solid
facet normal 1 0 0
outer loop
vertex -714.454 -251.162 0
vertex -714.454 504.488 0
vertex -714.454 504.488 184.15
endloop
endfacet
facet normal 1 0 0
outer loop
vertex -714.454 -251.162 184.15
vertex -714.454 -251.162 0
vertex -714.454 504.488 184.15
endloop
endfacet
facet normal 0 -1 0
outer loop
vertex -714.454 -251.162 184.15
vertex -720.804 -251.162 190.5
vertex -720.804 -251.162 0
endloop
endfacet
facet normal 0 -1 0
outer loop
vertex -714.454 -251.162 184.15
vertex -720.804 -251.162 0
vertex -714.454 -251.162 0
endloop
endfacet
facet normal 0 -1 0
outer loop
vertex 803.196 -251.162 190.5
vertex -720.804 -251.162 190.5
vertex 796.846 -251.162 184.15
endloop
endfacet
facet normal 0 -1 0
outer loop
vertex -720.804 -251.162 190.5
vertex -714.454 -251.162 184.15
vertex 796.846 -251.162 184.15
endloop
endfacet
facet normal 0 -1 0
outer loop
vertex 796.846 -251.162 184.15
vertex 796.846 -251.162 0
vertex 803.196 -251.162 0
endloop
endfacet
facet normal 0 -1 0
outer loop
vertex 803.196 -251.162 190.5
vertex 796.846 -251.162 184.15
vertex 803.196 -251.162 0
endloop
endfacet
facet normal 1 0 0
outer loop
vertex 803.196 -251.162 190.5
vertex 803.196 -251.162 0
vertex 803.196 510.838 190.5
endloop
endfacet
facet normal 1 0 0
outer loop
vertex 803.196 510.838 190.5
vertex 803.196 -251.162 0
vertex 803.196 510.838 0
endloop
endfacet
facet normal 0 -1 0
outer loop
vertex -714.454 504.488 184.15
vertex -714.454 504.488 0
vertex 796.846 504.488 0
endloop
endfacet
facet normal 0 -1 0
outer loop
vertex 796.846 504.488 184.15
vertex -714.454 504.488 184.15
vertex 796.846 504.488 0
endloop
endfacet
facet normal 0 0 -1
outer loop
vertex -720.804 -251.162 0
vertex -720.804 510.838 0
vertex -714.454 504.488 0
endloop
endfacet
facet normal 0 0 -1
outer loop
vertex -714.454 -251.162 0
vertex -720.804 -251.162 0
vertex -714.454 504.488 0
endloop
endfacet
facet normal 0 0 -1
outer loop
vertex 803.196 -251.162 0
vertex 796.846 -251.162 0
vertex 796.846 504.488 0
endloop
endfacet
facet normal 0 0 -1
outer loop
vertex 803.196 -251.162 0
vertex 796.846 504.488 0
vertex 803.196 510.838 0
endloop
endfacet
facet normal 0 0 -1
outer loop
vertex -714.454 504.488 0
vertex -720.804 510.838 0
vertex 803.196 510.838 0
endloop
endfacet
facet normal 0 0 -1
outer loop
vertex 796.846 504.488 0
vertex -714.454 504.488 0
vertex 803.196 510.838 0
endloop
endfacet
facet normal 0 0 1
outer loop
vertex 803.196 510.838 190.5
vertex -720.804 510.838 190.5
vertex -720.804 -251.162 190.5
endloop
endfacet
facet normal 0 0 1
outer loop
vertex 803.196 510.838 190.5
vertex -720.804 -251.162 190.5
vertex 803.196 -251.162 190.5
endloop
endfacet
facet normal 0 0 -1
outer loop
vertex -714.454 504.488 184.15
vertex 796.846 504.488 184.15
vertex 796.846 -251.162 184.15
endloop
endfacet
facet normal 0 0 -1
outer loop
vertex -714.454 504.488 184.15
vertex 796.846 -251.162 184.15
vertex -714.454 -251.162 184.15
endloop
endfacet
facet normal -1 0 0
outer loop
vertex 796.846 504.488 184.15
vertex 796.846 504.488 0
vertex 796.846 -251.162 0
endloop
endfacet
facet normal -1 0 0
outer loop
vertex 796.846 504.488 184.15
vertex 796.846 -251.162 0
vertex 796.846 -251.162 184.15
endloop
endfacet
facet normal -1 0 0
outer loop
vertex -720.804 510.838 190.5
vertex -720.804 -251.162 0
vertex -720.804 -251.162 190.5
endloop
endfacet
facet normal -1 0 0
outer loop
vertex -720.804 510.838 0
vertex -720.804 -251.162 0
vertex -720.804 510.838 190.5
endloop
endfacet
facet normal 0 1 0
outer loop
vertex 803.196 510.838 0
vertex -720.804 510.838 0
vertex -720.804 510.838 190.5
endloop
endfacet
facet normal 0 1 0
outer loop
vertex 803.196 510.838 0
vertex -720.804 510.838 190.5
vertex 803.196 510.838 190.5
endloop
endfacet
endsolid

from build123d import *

# Parameters (mm, degrees)
F0_W     = 1524
F0_H     = 762
F1_DEPTH = 190.5
F2_T     = -6.35
F3_W     = 1511.3
F3_H     = 184.15
F4_DEPTH = 25.4


with BuildPart() as f1:
    # F0 (on Top) → F1 (new body)
    with BuildSketch(Plane.XY):
        with Locations((41.196167, 129.838063)):
            Rectangle(F0_W, F0_H)
    extrude(amount=F1_DEPTH)

    # F2
    f2_openings = [f1.faces().sort_by_distance(p)[0] for p in [
        (41.196167, 129.838063, 0),
    ]]
    offset(amount=F2_T, openings=f2_openings)

    # F3 (on face) → F4 (cut)
    with BuildSketch(Plane(origin=(0, -244.811937, 0), x_dir=(-1, 0, 0), z_dir=(0, 1, 0))):
        with Locations((-41.196167, 92.075)):
            Rectangle(F3_W, F3_H)
    extrude(amount=-F4_DEPTH, mode=Mode.SUBTRACT)


solid = f1.part
